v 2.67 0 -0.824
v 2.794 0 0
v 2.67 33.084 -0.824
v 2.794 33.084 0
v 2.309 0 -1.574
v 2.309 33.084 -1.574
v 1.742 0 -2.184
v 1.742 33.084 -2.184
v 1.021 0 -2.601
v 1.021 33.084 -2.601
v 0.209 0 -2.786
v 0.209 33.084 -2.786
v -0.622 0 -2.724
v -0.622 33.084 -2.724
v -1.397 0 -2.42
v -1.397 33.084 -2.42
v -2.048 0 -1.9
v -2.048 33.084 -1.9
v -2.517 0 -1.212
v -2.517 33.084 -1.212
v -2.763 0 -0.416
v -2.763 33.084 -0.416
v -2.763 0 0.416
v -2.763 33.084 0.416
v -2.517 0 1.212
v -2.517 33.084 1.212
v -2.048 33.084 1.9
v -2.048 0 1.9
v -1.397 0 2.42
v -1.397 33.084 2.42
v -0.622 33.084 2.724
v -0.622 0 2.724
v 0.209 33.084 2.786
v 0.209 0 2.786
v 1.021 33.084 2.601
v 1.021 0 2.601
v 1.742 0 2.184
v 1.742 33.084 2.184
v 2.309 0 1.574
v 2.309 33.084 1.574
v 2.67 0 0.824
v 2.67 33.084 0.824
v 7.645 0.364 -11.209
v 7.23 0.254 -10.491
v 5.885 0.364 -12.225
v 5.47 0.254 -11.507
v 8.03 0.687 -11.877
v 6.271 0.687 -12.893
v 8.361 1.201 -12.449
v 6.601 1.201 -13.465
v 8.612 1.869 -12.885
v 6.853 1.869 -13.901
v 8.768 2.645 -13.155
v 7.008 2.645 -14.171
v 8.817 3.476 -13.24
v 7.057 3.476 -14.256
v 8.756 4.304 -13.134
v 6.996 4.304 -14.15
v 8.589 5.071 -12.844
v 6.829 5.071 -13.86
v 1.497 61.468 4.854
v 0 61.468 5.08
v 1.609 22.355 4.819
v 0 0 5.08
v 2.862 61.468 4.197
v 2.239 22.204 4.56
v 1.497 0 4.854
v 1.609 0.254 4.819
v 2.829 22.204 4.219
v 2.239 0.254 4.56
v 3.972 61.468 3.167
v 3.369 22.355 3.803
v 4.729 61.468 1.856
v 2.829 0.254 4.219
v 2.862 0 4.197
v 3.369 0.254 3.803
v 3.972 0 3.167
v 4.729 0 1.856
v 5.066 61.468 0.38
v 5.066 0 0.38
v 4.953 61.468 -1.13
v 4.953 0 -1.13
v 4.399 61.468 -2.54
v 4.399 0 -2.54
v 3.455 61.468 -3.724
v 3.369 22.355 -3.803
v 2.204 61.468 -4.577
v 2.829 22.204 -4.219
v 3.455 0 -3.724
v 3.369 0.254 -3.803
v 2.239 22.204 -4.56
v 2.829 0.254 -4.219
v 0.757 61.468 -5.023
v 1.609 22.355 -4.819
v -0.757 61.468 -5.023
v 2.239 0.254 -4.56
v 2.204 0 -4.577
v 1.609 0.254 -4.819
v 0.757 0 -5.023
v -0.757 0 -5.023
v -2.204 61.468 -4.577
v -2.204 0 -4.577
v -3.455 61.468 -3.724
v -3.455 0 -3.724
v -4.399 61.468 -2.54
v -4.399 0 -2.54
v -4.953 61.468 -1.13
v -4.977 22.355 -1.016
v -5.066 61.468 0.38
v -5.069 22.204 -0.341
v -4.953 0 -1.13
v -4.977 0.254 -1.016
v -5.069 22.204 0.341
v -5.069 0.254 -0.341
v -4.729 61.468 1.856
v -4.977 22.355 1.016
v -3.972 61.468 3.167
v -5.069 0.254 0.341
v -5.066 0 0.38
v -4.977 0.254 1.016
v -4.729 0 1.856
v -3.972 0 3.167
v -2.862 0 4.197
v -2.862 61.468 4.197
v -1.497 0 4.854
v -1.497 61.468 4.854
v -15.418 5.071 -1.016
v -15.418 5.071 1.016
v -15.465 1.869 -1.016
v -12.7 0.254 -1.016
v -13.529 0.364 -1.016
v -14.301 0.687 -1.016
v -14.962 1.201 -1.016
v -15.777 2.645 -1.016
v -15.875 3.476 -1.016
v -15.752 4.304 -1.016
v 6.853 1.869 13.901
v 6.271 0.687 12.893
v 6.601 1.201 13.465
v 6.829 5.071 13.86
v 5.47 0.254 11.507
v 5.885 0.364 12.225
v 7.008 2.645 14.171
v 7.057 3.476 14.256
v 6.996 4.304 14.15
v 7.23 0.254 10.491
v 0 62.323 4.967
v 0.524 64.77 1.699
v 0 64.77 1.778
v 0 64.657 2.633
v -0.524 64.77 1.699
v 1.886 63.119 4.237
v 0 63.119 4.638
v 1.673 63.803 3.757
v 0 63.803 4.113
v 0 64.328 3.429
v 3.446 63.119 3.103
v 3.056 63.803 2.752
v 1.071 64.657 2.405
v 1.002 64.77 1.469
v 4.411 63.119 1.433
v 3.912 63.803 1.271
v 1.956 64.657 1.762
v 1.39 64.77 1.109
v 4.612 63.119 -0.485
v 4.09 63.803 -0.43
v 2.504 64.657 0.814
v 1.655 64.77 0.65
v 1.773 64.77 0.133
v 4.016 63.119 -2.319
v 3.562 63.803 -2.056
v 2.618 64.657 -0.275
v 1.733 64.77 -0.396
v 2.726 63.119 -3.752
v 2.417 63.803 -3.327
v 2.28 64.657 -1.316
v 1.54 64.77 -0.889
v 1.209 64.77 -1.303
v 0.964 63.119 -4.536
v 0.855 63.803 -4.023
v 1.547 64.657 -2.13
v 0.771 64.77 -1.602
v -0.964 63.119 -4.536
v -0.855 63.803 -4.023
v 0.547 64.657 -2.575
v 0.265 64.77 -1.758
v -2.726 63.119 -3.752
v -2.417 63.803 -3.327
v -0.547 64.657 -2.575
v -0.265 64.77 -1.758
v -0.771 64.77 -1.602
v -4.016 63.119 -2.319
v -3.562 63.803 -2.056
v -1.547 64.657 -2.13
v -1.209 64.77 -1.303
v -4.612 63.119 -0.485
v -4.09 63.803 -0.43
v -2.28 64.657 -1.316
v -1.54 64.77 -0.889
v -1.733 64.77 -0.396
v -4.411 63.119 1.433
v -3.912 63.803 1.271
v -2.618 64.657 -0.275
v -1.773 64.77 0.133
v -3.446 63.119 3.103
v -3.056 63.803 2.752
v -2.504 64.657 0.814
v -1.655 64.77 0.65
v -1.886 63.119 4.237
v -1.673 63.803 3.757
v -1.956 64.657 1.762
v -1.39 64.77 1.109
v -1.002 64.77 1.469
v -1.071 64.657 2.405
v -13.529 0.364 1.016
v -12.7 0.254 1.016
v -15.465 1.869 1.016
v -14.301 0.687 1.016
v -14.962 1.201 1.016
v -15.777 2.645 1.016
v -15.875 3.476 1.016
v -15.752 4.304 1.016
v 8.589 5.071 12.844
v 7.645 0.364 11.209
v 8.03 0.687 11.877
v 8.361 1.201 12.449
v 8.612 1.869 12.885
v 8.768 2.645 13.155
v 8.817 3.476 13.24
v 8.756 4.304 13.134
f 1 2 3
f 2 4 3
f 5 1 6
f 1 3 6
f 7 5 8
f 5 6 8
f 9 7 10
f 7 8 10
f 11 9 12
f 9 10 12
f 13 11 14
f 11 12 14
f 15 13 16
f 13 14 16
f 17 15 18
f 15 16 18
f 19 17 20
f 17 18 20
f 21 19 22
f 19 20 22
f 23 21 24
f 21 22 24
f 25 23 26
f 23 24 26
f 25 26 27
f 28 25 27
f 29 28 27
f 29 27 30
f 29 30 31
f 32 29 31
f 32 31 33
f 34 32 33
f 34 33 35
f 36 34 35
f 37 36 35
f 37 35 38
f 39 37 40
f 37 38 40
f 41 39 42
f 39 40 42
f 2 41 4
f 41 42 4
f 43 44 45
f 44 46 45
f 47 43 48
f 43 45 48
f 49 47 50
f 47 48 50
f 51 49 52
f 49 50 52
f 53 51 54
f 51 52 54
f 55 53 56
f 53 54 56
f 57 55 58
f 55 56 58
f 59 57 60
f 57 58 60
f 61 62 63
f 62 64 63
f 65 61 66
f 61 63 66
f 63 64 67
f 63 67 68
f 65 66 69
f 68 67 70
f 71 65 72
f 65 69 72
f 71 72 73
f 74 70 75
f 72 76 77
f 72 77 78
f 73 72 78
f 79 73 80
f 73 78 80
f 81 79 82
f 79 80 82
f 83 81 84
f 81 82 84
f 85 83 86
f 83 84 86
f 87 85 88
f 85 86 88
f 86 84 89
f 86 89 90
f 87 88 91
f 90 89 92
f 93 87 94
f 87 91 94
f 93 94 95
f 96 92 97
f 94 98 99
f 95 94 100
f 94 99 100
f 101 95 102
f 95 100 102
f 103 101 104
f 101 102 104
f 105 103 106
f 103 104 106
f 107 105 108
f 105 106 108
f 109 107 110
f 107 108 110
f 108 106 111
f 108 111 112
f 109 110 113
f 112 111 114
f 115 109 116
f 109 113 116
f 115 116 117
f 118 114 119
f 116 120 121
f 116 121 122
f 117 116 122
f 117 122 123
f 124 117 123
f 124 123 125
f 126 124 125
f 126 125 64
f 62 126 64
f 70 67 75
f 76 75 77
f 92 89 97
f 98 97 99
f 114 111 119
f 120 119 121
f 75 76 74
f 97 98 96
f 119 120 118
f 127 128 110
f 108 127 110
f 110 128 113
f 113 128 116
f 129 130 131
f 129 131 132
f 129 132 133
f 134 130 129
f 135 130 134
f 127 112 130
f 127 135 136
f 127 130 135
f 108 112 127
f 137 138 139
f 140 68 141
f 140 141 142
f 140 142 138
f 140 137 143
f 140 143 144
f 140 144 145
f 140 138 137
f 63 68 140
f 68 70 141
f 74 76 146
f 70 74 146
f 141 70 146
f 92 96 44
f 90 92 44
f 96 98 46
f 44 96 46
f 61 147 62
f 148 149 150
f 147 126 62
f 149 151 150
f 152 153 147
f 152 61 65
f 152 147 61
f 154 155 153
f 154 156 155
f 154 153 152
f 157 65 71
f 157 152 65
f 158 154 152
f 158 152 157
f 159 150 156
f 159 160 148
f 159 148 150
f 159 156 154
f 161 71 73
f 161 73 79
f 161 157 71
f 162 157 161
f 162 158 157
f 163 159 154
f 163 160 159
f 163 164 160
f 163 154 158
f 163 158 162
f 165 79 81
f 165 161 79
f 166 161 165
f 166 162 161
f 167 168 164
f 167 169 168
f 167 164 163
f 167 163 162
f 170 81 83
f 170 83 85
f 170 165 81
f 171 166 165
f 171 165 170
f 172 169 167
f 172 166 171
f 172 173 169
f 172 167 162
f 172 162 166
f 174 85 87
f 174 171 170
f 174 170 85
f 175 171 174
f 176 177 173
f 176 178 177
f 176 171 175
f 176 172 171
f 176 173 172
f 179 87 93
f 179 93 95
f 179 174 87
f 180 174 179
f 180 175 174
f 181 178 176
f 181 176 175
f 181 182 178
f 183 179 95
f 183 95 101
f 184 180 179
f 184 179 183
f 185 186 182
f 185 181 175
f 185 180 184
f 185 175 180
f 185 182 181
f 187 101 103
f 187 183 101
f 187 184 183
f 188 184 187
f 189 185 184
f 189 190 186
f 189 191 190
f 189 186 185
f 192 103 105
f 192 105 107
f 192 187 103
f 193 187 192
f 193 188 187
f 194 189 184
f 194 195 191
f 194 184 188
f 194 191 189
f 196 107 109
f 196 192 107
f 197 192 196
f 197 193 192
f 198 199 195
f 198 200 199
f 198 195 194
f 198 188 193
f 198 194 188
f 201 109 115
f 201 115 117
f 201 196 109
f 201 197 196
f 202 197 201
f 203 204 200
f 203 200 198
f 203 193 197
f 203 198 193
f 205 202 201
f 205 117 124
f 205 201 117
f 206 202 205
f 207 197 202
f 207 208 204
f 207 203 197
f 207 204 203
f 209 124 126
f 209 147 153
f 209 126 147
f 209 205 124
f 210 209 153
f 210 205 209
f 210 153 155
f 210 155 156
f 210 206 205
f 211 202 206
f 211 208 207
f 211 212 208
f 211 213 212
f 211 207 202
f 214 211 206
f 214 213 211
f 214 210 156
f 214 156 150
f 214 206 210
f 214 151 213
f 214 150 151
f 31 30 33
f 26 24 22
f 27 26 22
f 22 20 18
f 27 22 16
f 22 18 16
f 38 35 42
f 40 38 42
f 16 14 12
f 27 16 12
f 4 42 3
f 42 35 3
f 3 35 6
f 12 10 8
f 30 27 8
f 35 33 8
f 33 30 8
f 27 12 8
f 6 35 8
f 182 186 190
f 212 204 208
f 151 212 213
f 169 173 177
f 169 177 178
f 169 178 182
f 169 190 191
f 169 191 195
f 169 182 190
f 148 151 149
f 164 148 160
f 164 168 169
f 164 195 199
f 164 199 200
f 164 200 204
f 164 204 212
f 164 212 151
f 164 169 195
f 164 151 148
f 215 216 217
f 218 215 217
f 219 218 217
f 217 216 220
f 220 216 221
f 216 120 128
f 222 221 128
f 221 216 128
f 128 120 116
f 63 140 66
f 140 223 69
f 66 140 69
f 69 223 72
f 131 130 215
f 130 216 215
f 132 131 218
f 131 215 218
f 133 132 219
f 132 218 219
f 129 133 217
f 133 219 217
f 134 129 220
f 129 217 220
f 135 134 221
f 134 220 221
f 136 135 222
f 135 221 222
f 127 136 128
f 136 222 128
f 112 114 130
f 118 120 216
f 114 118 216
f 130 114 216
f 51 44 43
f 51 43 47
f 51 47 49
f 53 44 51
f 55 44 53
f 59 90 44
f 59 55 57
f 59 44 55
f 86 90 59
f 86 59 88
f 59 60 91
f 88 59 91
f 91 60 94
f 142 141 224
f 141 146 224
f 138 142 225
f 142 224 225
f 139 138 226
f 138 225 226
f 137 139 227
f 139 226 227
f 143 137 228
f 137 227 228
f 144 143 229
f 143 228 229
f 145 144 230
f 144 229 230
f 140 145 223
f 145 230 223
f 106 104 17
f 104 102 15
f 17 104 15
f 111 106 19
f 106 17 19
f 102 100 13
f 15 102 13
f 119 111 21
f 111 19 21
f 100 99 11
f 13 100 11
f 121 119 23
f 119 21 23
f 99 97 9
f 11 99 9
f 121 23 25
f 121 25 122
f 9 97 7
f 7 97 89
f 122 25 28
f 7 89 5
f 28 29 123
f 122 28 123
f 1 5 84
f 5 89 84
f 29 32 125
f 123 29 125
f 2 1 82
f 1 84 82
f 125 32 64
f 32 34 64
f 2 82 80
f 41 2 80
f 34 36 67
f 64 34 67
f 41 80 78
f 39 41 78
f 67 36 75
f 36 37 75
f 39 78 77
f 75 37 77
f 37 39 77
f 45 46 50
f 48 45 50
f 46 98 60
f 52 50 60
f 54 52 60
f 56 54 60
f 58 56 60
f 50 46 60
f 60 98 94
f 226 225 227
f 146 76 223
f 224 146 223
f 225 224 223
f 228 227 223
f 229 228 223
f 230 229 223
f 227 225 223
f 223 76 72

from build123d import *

# Parameters (mm, degrees)
SKETCH1_R           = 5.08
BASE_EXTRUDE_DEPTH  = 64.77
FILLET1_R           = 3.302
SKETCH4_W           = 2.794
SKETCH4_H           = 33.0835
BOSS_EXTRUDE1_DEPTH = 1.016
CIRPATTERN1_COUNT   = 3


with BuildPart() as part:
    # Sketch1 → Base-Extrude (new body)
    with BuildSketch(Plane(origin=(0, 0, 0), x_dir=(1, 0, 0), z_dir=(0, 1, 0))):
        with Locations(Location((0, 0, 0), (0, 0, 270))):
            Circle(SKETCH1_R)
    extrude(amount=BASE_EXTRUDE_DEPTH)

    # Fillet1
    fillet1_edges = [part.edges().sort_by_distance(p)[0] for p in [
        (0, 64.77, -5.08),
    ]]
    fillet(fillet1_edges, radius=FILLET1_R)

    # Sketch4 → Cut-Revolve1 (revolve, cut)
    with BuildSketch(Plane.XY, mode=Mode.PRIVATE) as cut_revolve1_sk:
        with Locations((-1.397, 16.54175)):
            Rectangle(SKETCH4_W, SKETCH4_H)
    revolve(cut_revolve1_sk.sketch.rotate(Axis((0, 33.0835, 0), (0, 1, 0)), 180), axis=Axis((0, 33.0835, 0), (0, 1, 0)), mode=Mode.SUBTRACT)

    # Sketch3 → Boss-Extrude1 (add, symmetric)
    with BuildSketch(Plane.XY):
        with BuildLine():
            Line((-4.826, 0.254), (-12.7, 0.254))
            ThreePointArc((-12.7, 0.254), (-15.465187802, 1.868755974), (-15.417711968, 5.070543987))
            Line((-15.417711968, 5.070543987), (-4.826, 22.606))
            Line((-4.826, 22.606), (-4.826, 0.254))
        make_face()
    boss_extrude1 = extrude(amount=BOSS_EXTRUDE1_DEPTH, both=True)

    # CirPattern1: Boss-Extrude1 ×3 about axis
    cirpattern1_axis = Axis((0, 0, 0), (0, 1, 0))
    for i in range(1, CIRPATTERN1_COUNT):
        add(boss_extrude1.rotate(cirpattern1_axis, i * 360 / CIRPATTERN1_COUNT))


solid = part.part
